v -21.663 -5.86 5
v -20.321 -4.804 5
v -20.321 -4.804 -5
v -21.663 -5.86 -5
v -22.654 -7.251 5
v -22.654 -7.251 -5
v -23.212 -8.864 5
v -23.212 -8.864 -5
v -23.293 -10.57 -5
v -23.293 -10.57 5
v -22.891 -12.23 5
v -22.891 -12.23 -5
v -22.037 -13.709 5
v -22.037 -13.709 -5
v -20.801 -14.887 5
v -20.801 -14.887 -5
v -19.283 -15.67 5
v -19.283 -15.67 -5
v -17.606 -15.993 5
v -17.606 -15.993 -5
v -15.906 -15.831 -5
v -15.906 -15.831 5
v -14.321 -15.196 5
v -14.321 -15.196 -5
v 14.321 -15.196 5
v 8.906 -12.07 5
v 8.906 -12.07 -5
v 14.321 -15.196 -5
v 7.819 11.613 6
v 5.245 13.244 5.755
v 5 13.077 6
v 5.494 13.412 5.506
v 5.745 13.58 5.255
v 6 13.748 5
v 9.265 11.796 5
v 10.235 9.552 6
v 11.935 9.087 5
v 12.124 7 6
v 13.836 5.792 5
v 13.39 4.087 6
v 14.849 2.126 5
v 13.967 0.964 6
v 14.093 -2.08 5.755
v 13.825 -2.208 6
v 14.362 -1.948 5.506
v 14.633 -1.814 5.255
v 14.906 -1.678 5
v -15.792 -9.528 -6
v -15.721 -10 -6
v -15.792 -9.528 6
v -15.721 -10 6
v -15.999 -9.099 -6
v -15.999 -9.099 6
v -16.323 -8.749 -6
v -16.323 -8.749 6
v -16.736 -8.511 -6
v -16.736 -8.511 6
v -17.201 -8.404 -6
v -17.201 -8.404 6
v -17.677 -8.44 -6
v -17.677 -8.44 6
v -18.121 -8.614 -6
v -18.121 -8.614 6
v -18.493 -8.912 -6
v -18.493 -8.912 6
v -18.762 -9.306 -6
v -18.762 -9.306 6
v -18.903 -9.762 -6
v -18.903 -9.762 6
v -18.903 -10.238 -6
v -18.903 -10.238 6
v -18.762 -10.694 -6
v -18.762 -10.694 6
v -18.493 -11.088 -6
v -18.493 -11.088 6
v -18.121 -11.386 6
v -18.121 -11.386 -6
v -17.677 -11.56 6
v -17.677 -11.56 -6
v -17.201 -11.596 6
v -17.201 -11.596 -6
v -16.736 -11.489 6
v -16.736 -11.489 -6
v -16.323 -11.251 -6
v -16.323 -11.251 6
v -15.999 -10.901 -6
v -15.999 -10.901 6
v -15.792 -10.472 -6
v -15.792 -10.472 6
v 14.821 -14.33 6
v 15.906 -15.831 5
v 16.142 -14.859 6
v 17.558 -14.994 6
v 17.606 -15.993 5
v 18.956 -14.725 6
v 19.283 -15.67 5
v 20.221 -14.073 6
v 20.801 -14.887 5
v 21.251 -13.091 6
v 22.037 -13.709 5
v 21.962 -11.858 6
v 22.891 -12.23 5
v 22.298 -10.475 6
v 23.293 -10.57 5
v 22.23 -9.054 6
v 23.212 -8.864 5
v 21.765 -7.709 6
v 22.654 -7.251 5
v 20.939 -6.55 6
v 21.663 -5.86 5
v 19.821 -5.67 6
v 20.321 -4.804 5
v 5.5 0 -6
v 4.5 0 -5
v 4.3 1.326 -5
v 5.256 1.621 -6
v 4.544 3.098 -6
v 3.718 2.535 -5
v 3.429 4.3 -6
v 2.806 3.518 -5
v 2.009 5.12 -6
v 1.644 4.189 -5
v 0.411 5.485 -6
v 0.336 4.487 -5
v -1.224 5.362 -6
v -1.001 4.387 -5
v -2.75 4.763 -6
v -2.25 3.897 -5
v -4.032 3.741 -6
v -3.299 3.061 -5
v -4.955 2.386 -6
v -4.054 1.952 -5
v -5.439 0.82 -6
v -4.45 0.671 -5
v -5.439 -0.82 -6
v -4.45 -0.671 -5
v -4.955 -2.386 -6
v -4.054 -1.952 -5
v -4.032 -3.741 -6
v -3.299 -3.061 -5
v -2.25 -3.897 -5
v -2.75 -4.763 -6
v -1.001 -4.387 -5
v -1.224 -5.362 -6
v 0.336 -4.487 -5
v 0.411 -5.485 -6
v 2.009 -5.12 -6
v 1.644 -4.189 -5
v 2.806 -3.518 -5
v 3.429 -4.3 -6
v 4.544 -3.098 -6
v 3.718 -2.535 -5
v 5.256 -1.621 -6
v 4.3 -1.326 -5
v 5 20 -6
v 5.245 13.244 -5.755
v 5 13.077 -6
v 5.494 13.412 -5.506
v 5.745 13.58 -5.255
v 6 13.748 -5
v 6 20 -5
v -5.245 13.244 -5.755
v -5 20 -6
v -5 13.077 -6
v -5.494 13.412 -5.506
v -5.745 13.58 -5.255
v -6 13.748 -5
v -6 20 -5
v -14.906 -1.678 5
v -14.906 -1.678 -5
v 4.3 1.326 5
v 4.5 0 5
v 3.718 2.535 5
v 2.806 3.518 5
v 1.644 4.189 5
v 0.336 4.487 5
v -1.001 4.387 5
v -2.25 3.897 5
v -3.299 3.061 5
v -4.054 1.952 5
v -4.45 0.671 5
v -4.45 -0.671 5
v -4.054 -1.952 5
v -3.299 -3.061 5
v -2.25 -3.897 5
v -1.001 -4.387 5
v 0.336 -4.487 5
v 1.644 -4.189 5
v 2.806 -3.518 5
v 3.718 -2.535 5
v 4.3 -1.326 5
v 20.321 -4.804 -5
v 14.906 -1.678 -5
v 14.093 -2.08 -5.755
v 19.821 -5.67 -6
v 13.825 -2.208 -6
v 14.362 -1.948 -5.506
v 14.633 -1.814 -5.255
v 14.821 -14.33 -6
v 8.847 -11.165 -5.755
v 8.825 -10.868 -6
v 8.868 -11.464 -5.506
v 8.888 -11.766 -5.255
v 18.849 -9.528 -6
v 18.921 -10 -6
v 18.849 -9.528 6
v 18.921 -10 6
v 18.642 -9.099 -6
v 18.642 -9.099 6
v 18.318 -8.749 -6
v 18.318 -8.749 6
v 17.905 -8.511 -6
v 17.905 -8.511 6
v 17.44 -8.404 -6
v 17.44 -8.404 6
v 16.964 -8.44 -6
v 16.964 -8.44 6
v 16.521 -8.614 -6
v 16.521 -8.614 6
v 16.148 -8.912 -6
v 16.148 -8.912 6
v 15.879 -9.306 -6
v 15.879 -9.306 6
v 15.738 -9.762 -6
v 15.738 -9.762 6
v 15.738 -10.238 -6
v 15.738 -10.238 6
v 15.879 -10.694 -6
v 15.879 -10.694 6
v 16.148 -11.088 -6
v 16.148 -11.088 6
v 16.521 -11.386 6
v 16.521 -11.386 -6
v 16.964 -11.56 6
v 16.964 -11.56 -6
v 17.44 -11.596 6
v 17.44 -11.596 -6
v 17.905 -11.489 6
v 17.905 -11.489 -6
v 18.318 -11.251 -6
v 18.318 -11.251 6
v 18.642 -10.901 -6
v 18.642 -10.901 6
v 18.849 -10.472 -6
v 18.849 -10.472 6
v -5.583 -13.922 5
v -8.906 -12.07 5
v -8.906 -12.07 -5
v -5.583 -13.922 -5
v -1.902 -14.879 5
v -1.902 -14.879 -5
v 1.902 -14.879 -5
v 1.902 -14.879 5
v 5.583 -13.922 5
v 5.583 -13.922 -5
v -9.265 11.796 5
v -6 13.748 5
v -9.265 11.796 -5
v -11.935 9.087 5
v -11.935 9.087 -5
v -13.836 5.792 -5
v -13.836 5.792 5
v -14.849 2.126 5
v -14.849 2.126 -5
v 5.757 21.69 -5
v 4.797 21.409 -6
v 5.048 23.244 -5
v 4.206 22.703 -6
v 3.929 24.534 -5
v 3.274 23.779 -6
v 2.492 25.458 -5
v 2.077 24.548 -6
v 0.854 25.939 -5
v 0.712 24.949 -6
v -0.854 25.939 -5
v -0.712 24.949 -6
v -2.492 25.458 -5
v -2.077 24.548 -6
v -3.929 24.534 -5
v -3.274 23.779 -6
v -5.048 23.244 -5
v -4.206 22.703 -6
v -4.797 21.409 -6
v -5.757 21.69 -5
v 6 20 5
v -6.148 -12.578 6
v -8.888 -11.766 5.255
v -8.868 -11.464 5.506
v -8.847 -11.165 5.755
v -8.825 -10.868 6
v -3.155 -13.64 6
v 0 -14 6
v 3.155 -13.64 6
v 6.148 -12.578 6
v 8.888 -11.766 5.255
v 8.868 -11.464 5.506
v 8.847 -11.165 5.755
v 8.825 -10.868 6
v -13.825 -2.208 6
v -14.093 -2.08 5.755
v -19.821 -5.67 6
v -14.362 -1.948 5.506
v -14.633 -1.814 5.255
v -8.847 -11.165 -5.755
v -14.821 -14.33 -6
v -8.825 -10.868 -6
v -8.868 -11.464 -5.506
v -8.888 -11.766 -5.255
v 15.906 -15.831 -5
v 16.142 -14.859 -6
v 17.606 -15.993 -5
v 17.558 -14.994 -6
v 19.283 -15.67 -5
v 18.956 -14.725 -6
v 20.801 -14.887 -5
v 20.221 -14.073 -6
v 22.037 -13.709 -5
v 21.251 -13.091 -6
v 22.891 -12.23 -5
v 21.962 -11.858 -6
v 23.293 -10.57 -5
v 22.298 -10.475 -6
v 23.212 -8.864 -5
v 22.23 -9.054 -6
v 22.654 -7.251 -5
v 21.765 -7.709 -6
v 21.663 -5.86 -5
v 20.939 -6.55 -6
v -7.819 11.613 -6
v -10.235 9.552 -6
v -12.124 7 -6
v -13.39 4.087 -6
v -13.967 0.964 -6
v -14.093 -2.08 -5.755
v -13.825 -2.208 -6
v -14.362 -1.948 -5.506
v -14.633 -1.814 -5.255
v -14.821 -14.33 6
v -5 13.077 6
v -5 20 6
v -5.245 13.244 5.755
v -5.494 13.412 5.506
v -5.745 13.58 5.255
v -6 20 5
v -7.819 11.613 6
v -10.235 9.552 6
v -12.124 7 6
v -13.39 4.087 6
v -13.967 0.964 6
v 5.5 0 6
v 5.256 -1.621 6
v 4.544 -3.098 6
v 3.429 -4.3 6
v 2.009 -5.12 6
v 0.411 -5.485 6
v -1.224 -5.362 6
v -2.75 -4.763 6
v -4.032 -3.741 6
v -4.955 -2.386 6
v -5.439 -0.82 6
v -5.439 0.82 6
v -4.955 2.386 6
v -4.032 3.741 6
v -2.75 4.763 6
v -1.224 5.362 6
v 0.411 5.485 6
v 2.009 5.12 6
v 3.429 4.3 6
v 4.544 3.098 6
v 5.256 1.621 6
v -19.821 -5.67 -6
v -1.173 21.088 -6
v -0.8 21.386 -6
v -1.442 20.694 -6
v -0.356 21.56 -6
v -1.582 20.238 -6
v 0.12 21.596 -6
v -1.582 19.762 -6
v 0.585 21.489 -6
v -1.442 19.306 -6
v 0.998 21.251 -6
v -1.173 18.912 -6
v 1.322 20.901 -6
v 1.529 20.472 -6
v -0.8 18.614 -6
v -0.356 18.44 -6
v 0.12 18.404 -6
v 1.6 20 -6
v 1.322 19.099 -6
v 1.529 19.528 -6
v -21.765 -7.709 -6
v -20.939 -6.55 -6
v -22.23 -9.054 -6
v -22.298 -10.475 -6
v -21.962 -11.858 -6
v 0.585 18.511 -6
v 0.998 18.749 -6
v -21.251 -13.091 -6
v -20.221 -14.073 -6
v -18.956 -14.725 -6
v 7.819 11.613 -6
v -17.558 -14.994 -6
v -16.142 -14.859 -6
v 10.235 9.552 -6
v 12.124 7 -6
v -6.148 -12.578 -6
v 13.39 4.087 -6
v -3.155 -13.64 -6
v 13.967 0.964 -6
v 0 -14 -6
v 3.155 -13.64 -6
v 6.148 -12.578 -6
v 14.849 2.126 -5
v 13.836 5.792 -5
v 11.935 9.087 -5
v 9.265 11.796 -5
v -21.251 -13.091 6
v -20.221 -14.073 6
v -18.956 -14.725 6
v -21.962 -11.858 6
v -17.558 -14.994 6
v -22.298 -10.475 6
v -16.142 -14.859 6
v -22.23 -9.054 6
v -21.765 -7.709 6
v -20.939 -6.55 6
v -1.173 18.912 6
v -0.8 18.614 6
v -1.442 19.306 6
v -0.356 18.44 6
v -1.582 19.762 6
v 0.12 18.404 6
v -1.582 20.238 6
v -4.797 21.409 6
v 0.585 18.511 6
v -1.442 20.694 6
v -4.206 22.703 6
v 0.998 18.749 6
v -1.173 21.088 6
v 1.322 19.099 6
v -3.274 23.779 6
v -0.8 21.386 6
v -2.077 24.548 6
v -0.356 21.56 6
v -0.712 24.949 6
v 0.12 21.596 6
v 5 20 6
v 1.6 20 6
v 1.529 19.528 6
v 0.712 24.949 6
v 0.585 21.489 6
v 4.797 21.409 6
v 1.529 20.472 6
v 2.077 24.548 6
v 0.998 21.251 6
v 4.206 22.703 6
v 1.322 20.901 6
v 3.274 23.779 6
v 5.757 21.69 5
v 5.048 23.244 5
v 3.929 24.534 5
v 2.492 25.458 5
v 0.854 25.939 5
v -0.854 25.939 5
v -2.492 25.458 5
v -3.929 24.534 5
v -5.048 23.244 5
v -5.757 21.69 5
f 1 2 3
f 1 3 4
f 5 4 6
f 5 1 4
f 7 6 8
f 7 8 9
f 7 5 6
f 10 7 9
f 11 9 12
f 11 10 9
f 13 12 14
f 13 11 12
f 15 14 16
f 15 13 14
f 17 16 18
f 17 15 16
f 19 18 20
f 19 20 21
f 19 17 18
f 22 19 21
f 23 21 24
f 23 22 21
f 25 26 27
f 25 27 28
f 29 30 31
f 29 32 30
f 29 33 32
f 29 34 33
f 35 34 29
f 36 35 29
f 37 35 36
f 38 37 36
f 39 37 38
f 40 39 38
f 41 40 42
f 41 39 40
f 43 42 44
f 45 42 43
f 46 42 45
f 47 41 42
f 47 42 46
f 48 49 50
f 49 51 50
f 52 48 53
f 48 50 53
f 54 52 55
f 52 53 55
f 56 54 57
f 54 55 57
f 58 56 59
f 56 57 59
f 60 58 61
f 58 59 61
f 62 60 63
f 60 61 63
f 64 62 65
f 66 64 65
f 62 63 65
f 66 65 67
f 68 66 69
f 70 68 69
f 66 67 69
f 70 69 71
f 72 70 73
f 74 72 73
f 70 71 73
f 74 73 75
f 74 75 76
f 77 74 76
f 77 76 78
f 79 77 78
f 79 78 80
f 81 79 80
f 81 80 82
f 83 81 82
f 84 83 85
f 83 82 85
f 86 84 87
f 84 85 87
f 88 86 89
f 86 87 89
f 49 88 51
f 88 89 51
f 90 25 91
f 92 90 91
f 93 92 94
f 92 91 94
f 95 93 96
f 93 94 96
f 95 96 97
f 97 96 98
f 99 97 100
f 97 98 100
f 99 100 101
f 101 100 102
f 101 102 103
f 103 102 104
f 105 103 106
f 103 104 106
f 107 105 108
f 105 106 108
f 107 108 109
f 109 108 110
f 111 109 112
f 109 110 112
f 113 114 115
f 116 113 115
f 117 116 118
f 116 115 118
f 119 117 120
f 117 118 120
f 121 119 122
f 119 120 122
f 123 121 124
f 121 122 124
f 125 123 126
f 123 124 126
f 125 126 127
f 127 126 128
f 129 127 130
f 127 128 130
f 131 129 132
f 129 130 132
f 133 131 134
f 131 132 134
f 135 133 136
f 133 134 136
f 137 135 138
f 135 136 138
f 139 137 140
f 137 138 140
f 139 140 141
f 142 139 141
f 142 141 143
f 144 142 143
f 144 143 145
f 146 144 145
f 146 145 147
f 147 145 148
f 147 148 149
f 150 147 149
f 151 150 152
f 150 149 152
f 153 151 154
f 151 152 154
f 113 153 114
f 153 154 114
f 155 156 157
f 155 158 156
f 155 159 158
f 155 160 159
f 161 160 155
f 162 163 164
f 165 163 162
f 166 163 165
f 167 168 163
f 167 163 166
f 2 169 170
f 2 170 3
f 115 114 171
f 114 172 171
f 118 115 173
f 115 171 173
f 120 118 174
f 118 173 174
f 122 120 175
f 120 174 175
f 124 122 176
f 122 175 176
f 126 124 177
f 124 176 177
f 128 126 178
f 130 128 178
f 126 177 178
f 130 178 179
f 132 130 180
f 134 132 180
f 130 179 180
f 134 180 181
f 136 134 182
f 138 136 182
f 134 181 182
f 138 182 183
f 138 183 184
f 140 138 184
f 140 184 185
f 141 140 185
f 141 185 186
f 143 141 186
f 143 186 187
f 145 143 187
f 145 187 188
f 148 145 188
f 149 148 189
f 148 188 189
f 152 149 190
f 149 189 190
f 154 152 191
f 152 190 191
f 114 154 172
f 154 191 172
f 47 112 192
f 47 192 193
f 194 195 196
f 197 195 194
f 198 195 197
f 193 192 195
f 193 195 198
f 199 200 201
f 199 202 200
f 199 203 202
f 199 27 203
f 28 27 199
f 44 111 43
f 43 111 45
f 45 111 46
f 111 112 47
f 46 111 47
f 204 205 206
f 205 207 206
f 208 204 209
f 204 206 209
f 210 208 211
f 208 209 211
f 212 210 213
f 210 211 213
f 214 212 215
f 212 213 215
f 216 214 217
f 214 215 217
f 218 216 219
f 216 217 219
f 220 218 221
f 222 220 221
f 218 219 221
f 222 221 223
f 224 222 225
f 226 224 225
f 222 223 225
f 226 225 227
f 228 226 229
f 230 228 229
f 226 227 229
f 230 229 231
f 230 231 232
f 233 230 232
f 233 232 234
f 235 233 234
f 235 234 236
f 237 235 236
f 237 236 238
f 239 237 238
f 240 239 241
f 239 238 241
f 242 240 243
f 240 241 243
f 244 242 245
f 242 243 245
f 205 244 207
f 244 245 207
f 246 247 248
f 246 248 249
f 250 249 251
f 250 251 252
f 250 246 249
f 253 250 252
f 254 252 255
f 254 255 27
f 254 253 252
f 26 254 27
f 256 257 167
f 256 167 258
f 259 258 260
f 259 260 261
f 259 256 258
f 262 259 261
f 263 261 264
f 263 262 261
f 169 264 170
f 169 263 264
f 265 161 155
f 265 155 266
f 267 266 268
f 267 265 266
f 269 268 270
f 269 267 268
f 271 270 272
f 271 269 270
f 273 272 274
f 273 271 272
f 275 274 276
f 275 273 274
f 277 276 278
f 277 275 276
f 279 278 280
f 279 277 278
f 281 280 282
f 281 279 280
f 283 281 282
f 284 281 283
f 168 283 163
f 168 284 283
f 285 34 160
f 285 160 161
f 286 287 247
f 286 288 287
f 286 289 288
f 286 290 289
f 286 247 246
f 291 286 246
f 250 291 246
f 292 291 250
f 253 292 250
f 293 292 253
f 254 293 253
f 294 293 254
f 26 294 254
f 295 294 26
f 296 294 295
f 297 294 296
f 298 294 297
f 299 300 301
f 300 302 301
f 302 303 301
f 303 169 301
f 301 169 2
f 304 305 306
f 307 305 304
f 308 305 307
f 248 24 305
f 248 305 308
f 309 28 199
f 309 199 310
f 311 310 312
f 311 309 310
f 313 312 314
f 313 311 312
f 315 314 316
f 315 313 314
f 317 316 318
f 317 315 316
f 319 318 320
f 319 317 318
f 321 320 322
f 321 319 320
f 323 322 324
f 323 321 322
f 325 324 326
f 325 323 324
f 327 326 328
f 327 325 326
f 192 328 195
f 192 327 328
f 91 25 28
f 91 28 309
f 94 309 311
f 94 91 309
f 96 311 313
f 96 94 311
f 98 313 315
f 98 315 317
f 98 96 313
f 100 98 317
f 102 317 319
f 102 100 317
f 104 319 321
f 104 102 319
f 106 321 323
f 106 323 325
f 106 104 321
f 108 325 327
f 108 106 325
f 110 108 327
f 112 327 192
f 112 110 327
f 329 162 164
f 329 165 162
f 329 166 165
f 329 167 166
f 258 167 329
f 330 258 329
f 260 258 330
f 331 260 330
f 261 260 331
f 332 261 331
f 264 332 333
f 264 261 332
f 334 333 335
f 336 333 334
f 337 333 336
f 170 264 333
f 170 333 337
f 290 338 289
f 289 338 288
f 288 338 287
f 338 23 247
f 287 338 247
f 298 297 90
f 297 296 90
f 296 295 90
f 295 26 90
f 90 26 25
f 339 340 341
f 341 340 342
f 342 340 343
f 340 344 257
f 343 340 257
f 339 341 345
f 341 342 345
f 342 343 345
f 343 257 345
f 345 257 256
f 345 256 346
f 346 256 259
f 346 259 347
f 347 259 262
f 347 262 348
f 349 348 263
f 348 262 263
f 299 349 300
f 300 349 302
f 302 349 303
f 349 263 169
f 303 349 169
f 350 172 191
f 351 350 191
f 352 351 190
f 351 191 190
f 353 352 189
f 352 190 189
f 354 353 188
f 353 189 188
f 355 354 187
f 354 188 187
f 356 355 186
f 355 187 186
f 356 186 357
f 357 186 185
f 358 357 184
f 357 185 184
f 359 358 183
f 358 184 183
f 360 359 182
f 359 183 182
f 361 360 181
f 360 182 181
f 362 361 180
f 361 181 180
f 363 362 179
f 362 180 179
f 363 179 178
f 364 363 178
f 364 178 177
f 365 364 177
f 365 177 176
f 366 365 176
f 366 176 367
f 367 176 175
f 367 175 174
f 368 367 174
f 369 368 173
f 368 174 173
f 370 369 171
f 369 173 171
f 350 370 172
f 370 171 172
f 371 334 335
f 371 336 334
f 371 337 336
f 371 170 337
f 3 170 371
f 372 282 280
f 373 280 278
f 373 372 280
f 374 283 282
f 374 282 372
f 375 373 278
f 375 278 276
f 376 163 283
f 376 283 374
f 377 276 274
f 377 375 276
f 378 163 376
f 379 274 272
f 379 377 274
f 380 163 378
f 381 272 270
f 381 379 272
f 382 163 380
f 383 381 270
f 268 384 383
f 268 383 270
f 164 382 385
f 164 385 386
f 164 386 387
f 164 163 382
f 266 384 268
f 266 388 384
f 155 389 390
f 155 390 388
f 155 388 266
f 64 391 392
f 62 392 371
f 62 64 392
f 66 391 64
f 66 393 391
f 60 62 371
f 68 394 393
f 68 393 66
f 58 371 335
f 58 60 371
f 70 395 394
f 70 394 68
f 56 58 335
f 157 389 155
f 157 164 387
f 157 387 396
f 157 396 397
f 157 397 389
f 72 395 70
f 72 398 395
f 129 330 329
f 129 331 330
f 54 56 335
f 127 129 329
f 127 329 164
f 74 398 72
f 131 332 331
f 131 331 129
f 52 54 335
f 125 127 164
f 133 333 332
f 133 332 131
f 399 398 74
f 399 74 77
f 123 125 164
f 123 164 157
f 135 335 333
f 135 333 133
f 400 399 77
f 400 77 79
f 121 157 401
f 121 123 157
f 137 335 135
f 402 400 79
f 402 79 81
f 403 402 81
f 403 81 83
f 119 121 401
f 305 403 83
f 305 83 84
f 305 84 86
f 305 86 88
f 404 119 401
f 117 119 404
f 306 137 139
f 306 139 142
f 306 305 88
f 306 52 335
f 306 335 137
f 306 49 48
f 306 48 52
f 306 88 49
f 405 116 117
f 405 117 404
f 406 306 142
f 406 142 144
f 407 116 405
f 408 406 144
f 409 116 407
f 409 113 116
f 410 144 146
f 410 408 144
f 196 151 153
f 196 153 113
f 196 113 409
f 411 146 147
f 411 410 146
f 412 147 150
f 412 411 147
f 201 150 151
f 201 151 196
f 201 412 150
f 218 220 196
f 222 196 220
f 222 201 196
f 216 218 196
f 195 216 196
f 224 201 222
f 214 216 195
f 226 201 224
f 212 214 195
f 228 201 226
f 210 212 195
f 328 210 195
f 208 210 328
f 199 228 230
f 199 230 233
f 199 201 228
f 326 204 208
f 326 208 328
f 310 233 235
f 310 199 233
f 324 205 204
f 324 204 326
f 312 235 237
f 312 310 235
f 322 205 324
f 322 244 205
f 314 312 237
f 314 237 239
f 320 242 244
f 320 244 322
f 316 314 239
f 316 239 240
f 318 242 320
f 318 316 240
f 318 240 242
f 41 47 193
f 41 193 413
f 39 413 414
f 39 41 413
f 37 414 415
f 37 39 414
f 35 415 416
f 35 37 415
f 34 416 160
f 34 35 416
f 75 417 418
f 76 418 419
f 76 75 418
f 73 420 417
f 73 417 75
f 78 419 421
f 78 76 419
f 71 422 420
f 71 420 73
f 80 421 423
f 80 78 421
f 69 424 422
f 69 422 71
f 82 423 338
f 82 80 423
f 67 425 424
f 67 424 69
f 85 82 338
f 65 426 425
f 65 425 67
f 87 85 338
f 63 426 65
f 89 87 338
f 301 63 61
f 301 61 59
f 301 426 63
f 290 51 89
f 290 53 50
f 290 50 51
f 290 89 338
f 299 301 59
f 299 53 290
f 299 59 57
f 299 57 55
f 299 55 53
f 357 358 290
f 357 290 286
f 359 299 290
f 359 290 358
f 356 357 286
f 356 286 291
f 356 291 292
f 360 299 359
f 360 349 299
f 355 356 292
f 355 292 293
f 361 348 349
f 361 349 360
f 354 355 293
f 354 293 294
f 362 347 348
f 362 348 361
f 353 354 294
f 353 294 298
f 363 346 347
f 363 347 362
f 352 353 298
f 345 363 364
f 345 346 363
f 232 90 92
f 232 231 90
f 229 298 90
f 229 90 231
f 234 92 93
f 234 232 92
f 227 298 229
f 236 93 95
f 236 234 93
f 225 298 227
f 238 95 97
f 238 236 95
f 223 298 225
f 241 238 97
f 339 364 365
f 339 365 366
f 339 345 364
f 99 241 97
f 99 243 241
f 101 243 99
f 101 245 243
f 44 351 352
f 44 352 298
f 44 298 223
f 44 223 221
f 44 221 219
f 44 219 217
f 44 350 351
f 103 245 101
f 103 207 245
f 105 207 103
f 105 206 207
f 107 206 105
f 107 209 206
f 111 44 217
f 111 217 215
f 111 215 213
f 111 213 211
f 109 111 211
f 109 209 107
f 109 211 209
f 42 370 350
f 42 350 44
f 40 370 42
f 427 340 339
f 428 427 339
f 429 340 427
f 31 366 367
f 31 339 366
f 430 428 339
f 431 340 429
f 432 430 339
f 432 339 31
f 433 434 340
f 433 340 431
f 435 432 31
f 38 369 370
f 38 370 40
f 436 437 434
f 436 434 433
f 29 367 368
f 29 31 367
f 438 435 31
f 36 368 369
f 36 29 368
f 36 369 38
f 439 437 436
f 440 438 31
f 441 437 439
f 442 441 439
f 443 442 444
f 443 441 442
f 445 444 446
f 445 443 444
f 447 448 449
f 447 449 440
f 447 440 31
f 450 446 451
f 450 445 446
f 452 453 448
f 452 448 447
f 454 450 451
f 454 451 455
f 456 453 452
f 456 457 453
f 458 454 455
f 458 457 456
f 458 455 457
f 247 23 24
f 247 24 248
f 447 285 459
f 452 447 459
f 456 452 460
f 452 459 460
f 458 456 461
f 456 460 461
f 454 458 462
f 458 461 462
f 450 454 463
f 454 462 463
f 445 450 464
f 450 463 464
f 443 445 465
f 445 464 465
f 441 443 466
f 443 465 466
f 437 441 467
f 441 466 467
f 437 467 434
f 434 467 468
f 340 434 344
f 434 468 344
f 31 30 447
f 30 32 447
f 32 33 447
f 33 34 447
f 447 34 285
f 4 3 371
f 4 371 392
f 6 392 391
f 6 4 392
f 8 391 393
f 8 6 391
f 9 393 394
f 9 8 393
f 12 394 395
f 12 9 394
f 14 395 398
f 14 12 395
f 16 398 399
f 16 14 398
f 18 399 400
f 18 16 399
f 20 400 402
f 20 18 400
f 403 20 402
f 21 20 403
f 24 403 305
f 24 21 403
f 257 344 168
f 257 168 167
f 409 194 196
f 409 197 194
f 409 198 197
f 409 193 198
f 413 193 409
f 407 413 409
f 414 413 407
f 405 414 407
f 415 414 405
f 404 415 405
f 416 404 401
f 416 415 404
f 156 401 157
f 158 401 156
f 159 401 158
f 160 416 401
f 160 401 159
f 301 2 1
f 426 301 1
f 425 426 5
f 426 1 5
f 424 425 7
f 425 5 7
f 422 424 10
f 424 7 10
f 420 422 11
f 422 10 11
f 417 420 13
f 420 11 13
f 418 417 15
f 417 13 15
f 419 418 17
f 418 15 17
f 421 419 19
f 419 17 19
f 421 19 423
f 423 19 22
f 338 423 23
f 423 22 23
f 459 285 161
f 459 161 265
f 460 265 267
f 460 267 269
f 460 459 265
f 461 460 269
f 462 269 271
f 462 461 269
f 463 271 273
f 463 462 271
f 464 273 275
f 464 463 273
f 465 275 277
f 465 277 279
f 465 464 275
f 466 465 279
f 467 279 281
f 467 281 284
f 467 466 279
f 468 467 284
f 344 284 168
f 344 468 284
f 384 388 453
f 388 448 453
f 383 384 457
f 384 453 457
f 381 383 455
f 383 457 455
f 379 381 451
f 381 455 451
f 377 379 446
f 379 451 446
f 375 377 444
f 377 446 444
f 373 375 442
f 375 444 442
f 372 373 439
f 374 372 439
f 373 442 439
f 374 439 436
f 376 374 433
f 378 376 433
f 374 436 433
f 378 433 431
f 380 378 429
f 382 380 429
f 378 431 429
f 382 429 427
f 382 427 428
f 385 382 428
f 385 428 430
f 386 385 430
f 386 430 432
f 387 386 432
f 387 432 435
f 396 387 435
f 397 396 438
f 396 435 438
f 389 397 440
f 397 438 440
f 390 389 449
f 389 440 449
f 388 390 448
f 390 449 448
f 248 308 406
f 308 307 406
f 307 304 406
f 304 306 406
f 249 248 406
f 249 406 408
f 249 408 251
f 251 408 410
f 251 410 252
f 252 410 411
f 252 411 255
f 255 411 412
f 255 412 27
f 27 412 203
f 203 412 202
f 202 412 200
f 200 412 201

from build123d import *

# Parameters (mm, degrees)
SKETCH1_R                       = 15
BOSS_EXTRUDE1_DEPTH             = 6
BOSS_EXTRUDE2_REACH             = 8
BOSS_EXTRUDE2_DIRECTION_2_REACH = 8
SKETCH3_R                       = 4.5
CUT_EXTRUDE1_DEPTH              = 7
CUT_EXTRUDE1_DEPTH_BACK         = 7
CHAMFER1_SIZE                   = 1
SKETCH4_R                       = 1.6
CUT_EXTRUDE2_DEPTH              = 7
CUT_EXTRUDE2_DEPTH_BACK         = 7


with BuildPart() as part:
    # Sketch1 → Boss-Extrude1 (new body, symmetric)
    with BuildSketch(Plane.XY):
        Circle(SKETCH1_R)
    extrude(amount=BOSS_EXTRUDE1_DEPTH, both=True)

    # Boss-Extrude2: up to this face of the body (flat: up to its plane)
    boss_extrude2_end = Plane(part.part.faces().sort_by_distance((0, 0, 6))[0])
    # Sketch2 → Boss-Extrude2 (add, up to the picked face)
    with BuildSketch(Plane.XY, mode=Mode.PRIVATE) as boss_extrude2_sk1:
        with BuildLine():
            Line((-6, 20), (-6, 13.747727085))
            Line((-6, 13.747727085), (6, 13.747727085))
            Line((6, 13.747727085), (6, 20))
            ThreePointArc((6, 20), (0, 26), (-6, 20))
        make_face()
    boss_extrude2_tool1 = split(extrude(boss_extrude2_sk1.sketch, amount=BOSS_EXTRUDE2_REACH, mode=Mode.PRIVATE), bisect_by=boss_extrude2_end, keep=Keep.BOTH, mode=Mode.PRIVATE)
    add(boss_extrude2_tool1.solids().sort_by_distance((0, 19.311838, 0))[0])
    # Sketch2 → Boss-Extrude2 (add, up to the picked face)
    with BuildSketch(Plane.XY, mode=Mode.PRIVATE) as boss_extrude2_sk2:
        with BuildLine():
            Line((20.320508076, -4.803847577), (14.9058809, -1.67771112))
            Line((14.9058809, -1.67771112), (8.9058809, -12.070015965))
            Line((8.9058809, -12.070015965), (14.320508076, -15.196152423))
            ThreePointArc((14.320508076, -15.196152423), (22.516660498, -13), (20.320508076, -4.803847577))
        make_face()
    boss_extrude2_tool2 = split(extrude(boss_extrude2_sk2.sketch, amount=BOSS_EXTRUDE2_REACH, mode=Mode.PRIVATE), bisect_by=boss_extrude2_end, keep=Keep.BOTH, mode=Mode.PRIVATE)
    add(boss_extrude2_tool2.solids().sort_by_distance((16.724543, -9.655919, 0))[0])
    # Sketch2 → Boss-Extrude2 (add, up to the picked face)
    with BuildSketch(Plane.XY, mode=Mode.PRIVATE) as boss_extrude2_sk3:
        with BuildLine():
            Line((-14.320508076, -15.196152423), (-8.9058809, -12.070015965))
            Line((-8.9058809, -12.070015965), (-14.9058809, -1.67771112))
            Line((-14.9058809, -1.67771112), (-20.320508076, -4.803847577))
            ThreePointArc((-20.320508076, -4.803847577), (-22.516660498, -13), (-14.320508076, -15.196152423))
        make_face()
    boss_extrude2_tool3 = split(extrude(boss_extrude2_sk3.sketch, amount=BOSS_EXTRUDE2_REACH, mode=Mode.PRIVATE), bisect_by=boss_extrude2_end, keep=Keep.BOTH, mode=Mode.PRIVATE)
    add(boss_extrude2_tool3.solids().sort_by_distance((-16.724543, -9.655919, 0))[0])

    # Boss-Extrude2 direction 2: up to this face of the body (flat: up to its plane)
    boss_extrude2_direction_2_end = Plane(part.part.faces().sort_by_distance((0, 0, -6))[0])
    # Sketch2 → Boss-Extrude2 direction 2 (add, up to the picked face)
    with BuildSketch(Plane.XY, mode=Mode.PRIVATE) as boss_extrude2_direction_2_sk1:
        with BuildLine():
            Line((-6, 20), (-6, 13.747727085))
            Line((-6, 13.747727085), (6, 13.747727085))
            Line((6, 13.747727085), (6, 20))
            ThreePointArc((6, 20), (0, 26), (-6, 20))
        make_face()
    boss_extrude2_direction_2_tool1 = split(extrude(boss_extrude2_direction_2_sk1.sketch, amount=-BOSS_EXTRUDE2_DIRECTION_2_REACH, mode=Mode.PRIVATE), bisect_by=boss_extrude2_direction_2_end, keep=Keep.BOTH, mode=Mode.PRIVATE)
    add(boss_extrude2_direction_2_tool1.solids().sort_by_distance((0, 19.311838, 0))[0])
    # Sketch2 → Boss-Extrude2 direction 2 (add, up to the picked face)
    with BuildSketch(Plane.XY, mode=Mode.PRIVATE) as boss_extrude2_direction_2_sk2:
        with BuildLine():
            Line((20.320508076, -4.803847577), (14.9058809, -1.67771112))
            Line((14.9058809, -1.67771112), (8.9058809, -12.070015965))
            Line((8.9058809, -12.070015965), (14.320508076, -15.196152423))
            ThreePointArc((14.320508076, -15.196152423), (22.516660498, -13), (20.320508076, -4.803847577))
        make_face()
    boss_extrude2_direction_2_tool2 = split(extrude(boss_extrude2_direction_2_sk2.sketch, amount=-BOSS_EXTRUDE2_DIRECTION_2_REACH, mode=Mode.PRIVATE), bisect_by=boss_extrude2_direction_2_end, keep=Keep.BOTH, mode=Mode.PRIVATE)
    add(boss_extrude2_direction_2_tool2.solids().sort_by_distance((16.724543, -9.655919, 0))[0])
    # Sketch2 → Boss-Extrude2 direction 2 (add, up to the picked face)
    with BuildSketch(Plane.XY, mode=Mode.PRIVATE) as boss_extrude2_direction_2_sk3:
        with BuildLine():
            Line((-14.320508076, -15.196152423), (-8.9058809, -12.070015965))
            Line((-8.9058809, -12.070015965), (-14.9058809, -1.67771112))
            Line((-14.9058809, -1.67771112), (-20.320508076, -4.803847577))
            ThreePointArc((-20.320508076, -4.803847577), (-22.516660498, -13), (-14.320508076, -15.196152423))
        make_face()
    boss_extrude2_direction_2_tool3 = split(extrude(boss_extrude2_direction_2_sk3.sketch, amount=-BOSS_EXTRUDE2_DIRECTION_2_REACH, mode=Mode.PRIVATE), bisect_by=boss_extrude2_direction_2_end, keep=Keep.BOTH, mode=Mode.PRIVATE)
    add(boss_extrude2_direction_2_tool3.solids().sort_by_distance((-16.724543, -9.655919, 0))[0])

    # Sketch3 → Cut-Extrude1 (cut, two sides)
    with BuildSketch(Plane.XY) as cut_extrude1_sk:
        Circle(SKETCH3_R)
    extrude(amount=CUT_EXTRUDE1_DEPTH, mode=Mode.SUBTRACT)
    extrude(cut_extrude1_sk.sketch, amount=-CUT_EXTRUDE1_DEPTH_BACK, mode=Mode.SUBTRACT)

    # Chamfer1
    chamfer1_edges = [part.edges().sort_by_distance(p)[0] for p in [
        (12.990381057, 7.5, -6),
        (12.990381057, 7.5, 6),
        (11.613194488, -13.633084194, 6),
        (22.516660498, -13, 6),
        (17.613194488, -3.240779349, 6),
        (11.613194488, -13.633084194, -6),
        (17.613194488, -3.240779349, -6),
        (22.516660498, -13, -6),
        (0, -15, -6),
        (0, -15, 6),
        (-17.613194488, -3.240779349, 6),
        (-22.516660498, -13, 6),
        (-11.613194488, -13.633084194, 6),
        (-17.613194488, -3.240779349, -6),
        (-11.613194488, -13.633084194, -6),
        (-22.516660498, -13, -6),
        (-4.5, 0, -6),
        (-4.5, 0, 6),
        (-12.990381057, 7.5, -6),
        (-12.990381057, 7.5, 6),
        (6, 16.873863542, 6),
        (0, 26, 6),
        (-6, 16.873863542, 6),
        (6, 16.873863542, -6),
        (-6, 16.873863542, -6),
        (0, 26, -6),
    ]]
    chamfer(chamfer1_edges, length=CHAMFER1_SIZE)

    # Sketch4 → Cut-Extrude2 (cut, two sides)
    with BuildSketch(Plane.XY) as cut_extrude2_sk:
        with Locations((0, 20)):
            Circle(SKETCH4_R)
        with Locations((17.320508076, -10)):
            Circle(SKETCH4_R)
        with Locations((-17.320508076, -10)):
            Circle(SKETCH4_R)
    extrude(amount=CUT_EXTRUDE2_DEPTH, mode=Mode.SUBTRACT)
    extrude(cut_extrude2_sk.sketch, amount=-CUT_EXTRUDE2_DEPTH_BACK, mode=Mode.SUBTRACT)


solid = part.part
